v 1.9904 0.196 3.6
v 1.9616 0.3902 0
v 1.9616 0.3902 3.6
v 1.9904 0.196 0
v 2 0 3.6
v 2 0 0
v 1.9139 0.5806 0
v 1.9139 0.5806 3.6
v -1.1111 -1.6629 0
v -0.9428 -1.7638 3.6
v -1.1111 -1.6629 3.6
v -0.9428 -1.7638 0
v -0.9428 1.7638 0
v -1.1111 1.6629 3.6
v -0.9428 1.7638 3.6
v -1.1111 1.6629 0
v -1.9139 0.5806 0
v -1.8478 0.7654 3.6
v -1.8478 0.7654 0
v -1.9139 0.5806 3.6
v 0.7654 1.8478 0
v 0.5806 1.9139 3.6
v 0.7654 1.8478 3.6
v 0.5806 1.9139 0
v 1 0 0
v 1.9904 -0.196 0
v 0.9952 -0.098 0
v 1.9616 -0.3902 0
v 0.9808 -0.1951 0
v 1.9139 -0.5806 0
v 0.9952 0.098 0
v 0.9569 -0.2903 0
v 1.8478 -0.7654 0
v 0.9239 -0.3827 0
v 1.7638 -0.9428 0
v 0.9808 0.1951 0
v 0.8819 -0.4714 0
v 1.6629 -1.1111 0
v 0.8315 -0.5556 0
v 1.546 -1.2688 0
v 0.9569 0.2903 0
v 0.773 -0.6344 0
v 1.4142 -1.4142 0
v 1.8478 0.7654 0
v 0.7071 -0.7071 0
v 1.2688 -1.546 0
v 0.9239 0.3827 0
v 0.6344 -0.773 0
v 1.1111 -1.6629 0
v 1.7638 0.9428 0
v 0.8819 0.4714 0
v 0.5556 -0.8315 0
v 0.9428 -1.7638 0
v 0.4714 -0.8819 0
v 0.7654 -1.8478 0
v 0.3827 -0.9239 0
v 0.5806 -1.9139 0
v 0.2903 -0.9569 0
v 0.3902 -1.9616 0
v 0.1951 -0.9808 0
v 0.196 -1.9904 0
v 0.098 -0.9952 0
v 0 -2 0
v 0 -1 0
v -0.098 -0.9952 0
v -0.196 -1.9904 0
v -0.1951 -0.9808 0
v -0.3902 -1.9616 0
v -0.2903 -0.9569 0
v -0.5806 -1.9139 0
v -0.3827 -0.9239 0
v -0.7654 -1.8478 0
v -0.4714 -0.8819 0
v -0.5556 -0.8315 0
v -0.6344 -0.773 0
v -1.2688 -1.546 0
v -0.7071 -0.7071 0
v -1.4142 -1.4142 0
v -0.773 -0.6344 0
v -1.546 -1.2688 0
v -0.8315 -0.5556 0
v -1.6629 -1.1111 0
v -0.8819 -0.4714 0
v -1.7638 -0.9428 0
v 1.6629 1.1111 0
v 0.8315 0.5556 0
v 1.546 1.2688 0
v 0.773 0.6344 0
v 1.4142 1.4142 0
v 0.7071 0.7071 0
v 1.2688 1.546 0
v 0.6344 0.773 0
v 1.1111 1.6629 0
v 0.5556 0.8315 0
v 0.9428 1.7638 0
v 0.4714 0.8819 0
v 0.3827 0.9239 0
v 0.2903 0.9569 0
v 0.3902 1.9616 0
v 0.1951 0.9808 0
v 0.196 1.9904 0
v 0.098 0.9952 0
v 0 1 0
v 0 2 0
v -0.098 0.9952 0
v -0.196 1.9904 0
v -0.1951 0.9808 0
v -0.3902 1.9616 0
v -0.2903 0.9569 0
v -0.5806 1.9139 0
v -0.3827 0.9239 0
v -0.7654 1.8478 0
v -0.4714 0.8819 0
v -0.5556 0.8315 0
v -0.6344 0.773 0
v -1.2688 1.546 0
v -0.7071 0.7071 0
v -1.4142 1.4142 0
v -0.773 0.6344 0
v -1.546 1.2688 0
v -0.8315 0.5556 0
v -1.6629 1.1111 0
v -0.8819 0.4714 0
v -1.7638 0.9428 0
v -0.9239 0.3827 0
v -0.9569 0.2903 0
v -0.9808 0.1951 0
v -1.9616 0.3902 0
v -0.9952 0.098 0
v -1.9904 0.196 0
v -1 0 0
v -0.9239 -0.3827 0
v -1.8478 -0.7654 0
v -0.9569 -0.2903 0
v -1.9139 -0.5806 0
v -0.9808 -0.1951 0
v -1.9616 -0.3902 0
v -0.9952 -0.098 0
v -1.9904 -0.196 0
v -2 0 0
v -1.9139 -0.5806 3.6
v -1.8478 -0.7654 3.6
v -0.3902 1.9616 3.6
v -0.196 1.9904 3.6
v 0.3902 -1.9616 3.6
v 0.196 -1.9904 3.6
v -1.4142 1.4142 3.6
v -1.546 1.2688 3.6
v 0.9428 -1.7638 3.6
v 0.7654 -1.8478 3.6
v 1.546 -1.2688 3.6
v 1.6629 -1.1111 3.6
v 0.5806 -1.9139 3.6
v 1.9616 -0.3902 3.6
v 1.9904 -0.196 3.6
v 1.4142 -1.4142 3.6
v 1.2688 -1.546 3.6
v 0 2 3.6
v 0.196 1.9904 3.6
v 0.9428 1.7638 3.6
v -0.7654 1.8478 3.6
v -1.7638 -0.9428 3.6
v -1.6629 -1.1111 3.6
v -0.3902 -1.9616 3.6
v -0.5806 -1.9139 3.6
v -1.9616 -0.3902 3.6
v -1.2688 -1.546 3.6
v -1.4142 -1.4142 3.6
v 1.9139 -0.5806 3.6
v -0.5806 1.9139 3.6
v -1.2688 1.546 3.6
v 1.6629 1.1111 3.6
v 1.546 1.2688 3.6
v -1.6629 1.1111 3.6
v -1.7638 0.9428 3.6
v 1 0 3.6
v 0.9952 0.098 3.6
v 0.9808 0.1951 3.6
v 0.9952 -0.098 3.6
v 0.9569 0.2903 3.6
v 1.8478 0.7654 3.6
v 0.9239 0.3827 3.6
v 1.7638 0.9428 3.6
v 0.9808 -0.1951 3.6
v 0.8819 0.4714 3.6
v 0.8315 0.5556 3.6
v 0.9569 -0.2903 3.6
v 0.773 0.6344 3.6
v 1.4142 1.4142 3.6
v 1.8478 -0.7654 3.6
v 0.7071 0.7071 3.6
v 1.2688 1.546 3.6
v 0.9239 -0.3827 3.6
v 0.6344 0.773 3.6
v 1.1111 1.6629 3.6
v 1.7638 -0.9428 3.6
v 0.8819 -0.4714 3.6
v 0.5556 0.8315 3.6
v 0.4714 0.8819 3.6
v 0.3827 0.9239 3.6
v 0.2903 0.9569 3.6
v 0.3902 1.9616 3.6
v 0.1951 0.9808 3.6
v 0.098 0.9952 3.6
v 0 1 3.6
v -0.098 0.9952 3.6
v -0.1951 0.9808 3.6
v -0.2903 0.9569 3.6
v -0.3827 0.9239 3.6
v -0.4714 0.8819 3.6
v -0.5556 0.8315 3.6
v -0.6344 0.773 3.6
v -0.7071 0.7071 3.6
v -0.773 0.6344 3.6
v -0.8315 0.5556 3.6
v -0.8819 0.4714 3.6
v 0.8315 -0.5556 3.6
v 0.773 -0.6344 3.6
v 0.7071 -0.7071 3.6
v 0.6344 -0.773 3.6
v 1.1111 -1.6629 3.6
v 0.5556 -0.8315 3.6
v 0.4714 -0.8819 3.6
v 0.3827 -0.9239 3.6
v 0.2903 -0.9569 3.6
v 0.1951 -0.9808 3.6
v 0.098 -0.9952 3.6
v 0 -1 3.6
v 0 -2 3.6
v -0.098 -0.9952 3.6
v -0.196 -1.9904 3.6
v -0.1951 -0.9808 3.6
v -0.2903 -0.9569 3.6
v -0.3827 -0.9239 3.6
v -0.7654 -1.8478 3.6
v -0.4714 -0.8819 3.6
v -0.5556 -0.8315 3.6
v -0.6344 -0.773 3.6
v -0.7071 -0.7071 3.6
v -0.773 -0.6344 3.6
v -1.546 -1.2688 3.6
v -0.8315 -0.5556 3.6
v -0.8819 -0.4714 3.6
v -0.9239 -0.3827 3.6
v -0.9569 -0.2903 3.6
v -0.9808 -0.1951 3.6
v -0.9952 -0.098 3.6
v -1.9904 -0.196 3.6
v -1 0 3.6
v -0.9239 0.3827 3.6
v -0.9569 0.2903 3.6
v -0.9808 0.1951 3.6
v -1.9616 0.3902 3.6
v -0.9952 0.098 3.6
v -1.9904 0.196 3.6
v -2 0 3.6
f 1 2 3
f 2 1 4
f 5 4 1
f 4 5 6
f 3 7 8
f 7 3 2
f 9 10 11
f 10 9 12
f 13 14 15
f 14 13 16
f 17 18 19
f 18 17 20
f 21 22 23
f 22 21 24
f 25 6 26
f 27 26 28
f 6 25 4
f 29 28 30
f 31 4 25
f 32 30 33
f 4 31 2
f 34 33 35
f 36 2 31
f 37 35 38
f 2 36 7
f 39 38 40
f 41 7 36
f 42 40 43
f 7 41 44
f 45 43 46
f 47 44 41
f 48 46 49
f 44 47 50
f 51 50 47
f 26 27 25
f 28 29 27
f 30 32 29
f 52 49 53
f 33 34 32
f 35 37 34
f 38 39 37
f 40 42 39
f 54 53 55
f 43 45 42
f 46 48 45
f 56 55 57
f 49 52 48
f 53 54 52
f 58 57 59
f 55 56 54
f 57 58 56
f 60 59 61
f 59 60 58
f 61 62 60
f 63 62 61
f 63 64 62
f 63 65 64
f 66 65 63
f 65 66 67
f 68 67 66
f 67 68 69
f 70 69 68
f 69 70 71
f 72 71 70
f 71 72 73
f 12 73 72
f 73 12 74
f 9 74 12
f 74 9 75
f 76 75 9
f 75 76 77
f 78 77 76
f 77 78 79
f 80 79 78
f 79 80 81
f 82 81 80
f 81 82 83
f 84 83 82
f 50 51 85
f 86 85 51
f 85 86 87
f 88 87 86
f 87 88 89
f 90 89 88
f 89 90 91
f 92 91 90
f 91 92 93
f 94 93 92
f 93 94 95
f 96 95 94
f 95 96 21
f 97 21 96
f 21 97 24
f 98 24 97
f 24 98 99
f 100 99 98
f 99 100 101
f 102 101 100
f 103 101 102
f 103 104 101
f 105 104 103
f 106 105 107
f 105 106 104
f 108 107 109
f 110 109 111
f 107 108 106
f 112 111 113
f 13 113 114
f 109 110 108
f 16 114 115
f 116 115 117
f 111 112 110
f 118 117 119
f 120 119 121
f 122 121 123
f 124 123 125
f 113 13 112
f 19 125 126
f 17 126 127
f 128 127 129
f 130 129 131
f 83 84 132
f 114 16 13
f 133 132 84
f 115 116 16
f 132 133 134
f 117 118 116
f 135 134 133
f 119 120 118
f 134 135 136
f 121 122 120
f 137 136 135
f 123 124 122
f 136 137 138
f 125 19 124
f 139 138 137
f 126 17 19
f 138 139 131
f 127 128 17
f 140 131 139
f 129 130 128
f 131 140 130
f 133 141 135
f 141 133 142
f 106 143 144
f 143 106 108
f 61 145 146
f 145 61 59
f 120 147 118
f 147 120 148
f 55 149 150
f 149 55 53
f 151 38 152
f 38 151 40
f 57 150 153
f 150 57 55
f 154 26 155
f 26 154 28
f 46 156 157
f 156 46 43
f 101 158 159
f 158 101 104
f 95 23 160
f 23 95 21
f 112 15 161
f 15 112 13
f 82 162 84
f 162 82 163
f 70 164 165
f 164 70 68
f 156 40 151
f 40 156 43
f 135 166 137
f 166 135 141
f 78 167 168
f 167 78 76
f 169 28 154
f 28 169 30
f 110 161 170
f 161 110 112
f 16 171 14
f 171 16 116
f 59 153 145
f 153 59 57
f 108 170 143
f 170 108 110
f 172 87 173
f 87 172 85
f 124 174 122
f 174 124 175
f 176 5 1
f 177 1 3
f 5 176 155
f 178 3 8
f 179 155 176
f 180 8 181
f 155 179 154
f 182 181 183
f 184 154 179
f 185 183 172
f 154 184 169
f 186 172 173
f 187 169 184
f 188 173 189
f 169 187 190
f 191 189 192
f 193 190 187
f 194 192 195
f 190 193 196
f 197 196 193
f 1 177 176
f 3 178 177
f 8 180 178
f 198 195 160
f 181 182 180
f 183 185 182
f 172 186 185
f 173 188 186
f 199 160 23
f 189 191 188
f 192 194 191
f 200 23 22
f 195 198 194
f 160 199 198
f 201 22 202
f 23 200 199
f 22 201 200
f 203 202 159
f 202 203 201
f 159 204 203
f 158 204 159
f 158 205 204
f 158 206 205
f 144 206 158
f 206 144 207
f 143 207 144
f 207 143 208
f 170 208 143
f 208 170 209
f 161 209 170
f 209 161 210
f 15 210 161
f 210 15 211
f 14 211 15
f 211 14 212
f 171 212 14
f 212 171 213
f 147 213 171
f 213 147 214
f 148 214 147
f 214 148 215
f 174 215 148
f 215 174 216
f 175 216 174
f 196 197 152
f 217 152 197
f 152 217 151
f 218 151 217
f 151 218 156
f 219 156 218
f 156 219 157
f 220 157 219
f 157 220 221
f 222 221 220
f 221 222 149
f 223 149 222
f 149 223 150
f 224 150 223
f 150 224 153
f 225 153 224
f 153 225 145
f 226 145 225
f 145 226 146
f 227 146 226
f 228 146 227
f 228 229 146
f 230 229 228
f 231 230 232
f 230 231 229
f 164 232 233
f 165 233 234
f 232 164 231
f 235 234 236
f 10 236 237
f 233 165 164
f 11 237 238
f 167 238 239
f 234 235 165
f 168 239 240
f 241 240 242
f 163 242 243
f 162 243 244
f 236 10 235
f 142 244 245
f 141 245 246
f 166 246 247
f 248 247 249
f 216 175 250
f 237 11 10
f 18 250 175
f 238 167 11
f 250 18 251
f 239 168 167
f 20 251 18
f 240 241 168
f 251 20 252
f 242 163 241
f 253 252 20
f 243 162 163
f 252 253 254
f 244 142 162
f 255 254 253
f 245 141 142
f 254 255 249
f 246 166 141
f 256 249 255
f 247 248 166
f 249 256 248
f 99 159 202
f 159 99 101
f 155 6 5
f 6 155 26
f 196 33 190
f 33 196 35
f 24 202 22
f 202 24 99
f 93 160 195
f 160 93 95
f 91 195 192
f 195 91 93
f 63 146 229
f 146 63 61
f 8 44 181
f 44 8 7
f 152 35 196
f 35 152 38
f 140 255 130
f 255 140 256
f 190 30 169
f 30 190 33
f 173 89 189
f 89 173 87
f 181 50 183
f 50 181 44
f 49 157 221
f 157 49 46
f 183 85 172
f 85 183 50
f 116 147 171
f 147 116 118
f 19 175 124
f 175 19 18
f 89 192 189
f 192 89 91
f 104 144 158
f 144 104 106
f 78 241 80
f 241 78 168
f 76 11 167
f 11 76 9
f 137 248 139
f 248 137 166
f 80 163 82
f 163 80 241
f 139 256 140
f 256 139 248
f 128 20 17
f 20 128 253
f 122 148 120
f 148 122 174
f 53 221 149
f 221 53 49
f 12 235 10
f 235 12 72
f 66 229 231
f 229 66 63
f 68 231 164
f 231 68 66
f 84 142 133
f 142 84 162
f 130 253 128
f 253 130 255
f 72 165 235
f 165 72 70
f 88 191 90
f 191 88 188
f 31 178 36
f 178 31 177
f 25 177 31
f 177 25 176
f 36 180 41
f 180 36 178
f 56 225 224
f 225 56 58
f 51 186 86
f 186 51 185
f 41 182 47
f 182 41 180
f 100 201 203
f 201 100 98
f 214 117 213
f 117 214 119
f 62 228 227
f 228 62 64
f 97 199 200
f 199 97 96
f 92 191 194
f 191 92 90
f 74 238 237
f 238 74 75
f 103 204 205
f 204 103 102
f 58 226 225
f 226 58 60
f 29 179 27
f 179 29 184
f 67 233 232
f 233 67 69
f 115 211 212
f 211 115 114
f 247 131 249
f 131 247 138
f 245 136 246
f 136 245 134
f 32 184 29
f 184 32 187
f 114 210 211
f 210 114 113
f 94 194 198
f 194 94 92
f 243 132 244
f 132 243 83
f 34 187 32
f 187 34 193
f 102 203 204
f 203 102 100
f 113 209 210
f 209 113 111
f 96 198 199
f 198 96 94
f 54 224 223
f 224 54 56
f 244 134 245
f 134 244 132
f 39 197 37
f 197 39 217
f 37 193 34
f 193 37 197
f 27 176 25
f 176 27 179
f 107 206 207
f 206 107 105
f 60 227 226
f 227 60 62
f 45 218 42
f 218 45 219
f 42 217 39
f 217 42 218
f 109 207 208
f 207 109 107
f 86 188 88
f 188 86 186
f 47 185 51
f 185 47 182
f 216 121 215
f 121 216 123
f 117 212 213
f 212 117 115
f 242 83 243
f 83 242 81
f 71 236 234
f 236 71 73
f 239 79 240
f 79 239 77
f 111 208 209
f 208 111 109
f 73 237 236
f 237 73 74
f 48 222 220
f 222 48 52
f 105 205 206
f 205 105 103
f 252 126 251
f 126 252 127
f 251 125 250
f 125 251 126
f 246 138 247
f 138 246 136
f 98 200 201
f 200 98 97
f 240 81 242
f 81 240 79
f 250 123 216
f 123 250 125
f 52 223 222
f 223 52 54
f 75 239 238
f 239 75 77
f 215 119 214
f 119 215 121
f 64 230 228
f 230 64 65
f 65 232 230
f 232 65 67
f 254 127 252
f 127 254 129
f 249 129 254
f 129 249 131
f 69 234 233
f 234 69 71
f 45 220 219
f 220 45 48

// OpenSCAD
module threaded_insert() {
    difference() {
        cylinder(h=3.6, d=4.0, $fn=64);
        translate([0, 0, -1]) {
            cylinder(h=5.6, d=2.0, $fn=64);
        }
    }
}

threaded_insert();
